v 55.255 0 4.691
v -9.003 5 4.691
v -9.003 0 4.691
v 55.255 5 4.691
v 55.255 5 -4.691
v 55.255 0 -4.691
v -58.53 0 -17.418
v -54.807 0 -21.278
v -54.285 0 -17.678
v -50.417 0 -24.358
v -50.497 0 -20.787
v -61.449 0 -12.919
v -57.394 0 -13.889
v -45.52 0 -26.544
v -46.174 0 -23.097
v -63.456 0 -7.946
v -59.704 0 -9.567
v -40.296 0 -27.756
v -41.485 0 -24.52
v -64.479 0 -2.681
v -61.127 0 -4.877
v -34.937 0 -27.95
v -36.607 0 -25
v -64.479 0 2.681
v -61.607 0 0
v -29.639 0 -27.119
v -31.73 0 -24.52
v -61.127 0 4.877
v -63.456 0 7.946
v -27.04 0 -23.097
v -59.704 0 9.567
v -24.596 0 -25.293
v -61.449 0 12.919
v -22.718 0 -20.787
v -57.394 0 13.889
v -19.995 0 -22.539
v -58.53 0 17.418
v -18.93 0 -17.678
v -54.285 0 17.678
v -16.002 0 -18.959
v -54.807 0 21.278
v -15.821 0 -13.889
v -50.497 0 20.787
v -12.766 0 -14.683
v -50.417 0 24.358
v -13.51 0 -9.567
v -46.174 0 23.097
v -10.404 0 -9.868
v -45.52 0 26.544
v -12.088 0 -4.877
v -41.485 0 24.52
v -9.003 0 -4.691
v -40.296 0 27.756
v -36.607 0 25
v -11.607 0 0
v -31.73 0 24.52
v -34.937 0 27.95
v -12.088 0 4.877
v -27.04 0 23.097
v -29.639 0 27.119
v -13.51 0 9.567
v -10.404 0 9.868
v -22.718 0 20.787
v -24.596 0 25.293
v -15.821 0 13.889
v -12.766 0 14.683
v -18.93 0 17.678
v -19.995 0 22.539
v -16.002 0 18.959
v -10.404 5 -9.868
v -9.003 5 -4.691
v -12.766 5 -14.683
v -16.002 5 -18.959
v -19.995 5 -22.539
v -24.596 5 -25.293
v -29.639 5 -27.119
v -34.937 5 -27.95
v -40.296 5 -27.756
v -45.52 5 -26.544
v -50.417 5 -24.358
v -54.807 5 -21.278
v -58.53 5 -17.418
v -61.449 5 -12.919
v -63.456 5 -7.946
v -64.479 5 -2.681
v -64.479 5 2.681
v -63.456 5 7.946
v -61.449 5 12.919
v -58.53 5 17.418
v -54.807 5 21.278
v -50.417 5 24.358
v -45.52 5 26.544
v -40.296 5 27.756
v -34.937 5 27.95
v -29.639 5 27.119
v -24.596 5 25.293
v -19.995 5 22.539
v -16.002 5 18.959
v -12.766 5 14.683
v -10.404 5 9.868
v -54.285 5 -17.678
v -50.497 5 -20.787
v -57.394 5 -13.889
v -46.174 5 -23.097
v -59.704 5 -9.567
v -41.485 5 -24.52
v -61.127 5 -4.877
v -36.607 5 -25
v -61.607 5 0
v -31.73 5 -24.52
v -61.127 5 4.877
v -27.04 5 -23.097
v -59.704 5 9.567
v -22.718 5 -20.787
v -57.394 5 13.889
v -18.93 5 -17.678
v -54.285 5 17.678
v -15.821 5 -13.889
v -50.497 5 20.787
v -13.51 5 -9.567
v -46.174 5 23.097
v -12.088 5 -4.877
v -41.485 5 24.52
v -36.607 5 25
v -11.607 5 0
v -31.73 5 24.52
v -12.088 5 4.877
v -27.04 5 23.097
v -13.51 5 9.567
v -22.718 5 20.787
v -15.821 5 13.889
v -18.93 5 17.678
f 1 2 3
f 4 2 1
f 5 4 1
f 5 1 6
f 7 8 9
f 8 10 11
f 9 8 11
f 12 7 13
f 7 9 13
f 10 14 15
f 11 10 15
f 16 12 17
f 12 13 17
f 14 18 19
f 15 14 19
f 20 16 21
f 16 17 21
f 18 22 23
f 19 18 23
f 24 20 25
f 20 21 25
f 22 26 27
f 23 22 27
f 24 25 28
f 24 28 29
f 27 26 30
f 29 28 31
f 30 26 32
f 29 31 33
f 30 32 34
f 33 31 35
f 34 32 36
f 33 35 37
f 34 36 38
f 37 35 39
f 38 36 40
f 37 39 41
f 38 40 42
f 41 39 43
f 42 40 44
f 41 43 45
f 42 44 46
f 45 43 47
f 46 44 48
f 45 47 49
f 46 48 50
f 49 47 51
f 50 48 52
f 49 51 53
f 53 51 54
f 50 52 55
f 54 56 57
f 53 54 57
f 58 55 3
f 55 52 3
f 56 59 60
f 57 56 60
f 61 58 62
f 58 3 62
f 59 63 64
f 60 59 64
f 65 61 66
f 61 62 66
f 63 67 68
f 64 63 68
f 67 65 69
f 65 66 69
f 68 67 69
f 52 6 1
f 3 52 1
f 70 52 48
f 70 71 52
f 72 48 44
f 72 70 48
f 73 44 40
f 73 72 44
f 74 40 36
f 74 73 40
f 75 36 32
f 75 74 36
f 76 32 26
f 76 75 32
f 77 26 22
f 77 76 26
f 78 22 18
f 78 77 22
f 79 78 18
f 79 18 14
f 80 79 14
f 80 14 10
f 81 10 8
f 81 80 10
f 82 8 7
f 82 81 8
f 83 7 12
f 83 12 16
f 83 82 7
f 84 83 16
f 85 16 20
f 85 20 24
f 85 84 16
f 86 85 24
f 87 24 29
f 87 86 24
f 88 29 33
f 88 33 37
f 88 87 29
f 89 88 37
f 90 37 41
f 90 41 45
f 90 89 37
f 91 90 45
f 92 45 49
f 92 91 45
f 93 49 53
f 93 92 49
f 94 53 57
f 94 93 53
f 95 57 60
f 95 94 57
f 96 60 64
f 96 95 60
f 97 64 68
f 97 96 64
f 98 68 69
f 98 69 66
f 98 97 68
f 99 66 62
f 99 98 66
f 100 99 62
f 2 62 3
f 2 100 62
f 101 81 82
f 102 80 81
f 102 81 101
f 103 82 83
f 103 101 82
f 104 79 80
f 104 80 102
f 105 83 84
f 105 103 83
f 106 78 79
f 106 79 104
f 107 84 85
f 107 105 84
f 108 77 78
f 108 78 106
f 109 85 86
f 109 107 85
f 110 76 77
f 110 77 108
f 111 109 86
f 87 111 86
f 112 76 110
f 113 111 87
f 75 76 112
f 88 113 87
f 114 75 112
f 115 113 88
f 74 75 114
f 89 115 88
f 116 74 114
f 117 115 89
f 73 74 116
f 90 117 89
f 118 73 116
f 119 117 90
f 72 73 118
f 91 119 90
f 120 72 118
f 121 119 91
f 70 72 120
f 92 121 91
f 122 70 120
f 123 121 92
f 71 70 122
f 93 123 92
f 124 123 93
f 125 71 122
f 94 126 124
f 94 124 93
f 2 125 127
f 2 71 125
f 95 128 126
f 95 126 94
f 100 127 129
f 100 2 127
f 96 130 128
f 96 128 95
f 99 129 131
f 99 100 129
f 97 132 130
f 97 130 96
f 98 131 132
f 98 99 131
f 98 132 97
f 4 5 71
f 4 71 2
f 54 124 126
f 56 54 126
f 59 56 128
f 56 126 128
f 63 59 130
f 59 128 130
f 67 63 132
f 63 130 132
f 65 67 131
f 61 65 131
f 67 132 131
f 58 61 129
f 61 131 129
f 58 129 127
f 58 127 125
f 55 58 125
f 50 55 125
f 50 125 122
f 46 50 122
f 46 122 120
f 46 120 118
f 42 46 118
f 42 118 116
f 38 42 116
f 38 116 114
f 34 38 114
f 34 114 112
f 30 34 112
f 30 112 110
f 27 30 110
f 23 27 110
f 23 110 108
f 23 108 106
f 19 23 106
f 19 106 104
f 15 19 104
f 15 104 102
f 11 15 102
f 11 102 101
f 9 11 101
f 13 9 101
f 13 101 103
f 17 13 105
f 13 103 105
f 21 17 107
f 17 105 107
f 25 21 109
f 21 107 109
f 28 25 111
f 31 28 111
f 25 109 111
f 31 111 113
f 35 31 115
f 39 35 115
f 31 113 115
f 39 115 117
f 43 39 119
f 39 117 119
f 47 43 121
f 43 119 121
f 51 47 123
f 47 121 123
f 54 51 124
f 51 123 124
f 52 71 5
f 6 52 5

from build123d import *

# Parameters (mm, degrees)
ESQUISSE5_R             = 28
BOSS_EXTRU_5_DEPTH      = 5
ESQUISSE6_R             = 25
ENL_V_MAT_EXTRU_1_DEPTH = 10
ESQUISSE7_W             = 65
ESQUISSE7_H             = 9.382686356
BOSS_EXTRU_6_DEPTH      = 5


with BuildPart() as part:
    # Esquisse5 → Boss.-Extru.5 (new body)
    with BuildSketch(Plane(origin=(0, 5, 0), x_dir=(1, 0, 0), z_dir=(0, 1, 0))):
        with Locations(Location((-36.607266223, 0, 0), (0, 0, 270))):
            Circle(ESQUISSE5_R)
    extrude(amount=-BOSS_EXTRU_5_DEPTH)

    # Esquisse6 → Enlèv. mat.-Extru.1 (cut)
    with BuildSketch(Plane(origin=(0, 5, 0), x_dir=(1, 0, 0), z_dir=(0, 1, 0))):
        with Locations(Location((-36.607266223, 0, 0), (0, 0, 270))):
            Circle(ESQUISSE6_R)
    extrude(amount=-ENL_V_MAT_EXTRU_1_DEPTH, mode=Mode.SUBTRACT)

    # Esquisse7 → Boss.-Extru.6 (add)
    with BuildSketch(Plane(origin=(0, 5, 0), x_dir=(1, 0, 0), z_dir=(0, 1, 0))):
        with Locations((22.754788201, 0)):
            Rectangle(ESQUISSE7_W, ESQUISSE7_H)
    extrude(amount=-BOSS_EXTRU_6_DEPTH)


solid = part.part
